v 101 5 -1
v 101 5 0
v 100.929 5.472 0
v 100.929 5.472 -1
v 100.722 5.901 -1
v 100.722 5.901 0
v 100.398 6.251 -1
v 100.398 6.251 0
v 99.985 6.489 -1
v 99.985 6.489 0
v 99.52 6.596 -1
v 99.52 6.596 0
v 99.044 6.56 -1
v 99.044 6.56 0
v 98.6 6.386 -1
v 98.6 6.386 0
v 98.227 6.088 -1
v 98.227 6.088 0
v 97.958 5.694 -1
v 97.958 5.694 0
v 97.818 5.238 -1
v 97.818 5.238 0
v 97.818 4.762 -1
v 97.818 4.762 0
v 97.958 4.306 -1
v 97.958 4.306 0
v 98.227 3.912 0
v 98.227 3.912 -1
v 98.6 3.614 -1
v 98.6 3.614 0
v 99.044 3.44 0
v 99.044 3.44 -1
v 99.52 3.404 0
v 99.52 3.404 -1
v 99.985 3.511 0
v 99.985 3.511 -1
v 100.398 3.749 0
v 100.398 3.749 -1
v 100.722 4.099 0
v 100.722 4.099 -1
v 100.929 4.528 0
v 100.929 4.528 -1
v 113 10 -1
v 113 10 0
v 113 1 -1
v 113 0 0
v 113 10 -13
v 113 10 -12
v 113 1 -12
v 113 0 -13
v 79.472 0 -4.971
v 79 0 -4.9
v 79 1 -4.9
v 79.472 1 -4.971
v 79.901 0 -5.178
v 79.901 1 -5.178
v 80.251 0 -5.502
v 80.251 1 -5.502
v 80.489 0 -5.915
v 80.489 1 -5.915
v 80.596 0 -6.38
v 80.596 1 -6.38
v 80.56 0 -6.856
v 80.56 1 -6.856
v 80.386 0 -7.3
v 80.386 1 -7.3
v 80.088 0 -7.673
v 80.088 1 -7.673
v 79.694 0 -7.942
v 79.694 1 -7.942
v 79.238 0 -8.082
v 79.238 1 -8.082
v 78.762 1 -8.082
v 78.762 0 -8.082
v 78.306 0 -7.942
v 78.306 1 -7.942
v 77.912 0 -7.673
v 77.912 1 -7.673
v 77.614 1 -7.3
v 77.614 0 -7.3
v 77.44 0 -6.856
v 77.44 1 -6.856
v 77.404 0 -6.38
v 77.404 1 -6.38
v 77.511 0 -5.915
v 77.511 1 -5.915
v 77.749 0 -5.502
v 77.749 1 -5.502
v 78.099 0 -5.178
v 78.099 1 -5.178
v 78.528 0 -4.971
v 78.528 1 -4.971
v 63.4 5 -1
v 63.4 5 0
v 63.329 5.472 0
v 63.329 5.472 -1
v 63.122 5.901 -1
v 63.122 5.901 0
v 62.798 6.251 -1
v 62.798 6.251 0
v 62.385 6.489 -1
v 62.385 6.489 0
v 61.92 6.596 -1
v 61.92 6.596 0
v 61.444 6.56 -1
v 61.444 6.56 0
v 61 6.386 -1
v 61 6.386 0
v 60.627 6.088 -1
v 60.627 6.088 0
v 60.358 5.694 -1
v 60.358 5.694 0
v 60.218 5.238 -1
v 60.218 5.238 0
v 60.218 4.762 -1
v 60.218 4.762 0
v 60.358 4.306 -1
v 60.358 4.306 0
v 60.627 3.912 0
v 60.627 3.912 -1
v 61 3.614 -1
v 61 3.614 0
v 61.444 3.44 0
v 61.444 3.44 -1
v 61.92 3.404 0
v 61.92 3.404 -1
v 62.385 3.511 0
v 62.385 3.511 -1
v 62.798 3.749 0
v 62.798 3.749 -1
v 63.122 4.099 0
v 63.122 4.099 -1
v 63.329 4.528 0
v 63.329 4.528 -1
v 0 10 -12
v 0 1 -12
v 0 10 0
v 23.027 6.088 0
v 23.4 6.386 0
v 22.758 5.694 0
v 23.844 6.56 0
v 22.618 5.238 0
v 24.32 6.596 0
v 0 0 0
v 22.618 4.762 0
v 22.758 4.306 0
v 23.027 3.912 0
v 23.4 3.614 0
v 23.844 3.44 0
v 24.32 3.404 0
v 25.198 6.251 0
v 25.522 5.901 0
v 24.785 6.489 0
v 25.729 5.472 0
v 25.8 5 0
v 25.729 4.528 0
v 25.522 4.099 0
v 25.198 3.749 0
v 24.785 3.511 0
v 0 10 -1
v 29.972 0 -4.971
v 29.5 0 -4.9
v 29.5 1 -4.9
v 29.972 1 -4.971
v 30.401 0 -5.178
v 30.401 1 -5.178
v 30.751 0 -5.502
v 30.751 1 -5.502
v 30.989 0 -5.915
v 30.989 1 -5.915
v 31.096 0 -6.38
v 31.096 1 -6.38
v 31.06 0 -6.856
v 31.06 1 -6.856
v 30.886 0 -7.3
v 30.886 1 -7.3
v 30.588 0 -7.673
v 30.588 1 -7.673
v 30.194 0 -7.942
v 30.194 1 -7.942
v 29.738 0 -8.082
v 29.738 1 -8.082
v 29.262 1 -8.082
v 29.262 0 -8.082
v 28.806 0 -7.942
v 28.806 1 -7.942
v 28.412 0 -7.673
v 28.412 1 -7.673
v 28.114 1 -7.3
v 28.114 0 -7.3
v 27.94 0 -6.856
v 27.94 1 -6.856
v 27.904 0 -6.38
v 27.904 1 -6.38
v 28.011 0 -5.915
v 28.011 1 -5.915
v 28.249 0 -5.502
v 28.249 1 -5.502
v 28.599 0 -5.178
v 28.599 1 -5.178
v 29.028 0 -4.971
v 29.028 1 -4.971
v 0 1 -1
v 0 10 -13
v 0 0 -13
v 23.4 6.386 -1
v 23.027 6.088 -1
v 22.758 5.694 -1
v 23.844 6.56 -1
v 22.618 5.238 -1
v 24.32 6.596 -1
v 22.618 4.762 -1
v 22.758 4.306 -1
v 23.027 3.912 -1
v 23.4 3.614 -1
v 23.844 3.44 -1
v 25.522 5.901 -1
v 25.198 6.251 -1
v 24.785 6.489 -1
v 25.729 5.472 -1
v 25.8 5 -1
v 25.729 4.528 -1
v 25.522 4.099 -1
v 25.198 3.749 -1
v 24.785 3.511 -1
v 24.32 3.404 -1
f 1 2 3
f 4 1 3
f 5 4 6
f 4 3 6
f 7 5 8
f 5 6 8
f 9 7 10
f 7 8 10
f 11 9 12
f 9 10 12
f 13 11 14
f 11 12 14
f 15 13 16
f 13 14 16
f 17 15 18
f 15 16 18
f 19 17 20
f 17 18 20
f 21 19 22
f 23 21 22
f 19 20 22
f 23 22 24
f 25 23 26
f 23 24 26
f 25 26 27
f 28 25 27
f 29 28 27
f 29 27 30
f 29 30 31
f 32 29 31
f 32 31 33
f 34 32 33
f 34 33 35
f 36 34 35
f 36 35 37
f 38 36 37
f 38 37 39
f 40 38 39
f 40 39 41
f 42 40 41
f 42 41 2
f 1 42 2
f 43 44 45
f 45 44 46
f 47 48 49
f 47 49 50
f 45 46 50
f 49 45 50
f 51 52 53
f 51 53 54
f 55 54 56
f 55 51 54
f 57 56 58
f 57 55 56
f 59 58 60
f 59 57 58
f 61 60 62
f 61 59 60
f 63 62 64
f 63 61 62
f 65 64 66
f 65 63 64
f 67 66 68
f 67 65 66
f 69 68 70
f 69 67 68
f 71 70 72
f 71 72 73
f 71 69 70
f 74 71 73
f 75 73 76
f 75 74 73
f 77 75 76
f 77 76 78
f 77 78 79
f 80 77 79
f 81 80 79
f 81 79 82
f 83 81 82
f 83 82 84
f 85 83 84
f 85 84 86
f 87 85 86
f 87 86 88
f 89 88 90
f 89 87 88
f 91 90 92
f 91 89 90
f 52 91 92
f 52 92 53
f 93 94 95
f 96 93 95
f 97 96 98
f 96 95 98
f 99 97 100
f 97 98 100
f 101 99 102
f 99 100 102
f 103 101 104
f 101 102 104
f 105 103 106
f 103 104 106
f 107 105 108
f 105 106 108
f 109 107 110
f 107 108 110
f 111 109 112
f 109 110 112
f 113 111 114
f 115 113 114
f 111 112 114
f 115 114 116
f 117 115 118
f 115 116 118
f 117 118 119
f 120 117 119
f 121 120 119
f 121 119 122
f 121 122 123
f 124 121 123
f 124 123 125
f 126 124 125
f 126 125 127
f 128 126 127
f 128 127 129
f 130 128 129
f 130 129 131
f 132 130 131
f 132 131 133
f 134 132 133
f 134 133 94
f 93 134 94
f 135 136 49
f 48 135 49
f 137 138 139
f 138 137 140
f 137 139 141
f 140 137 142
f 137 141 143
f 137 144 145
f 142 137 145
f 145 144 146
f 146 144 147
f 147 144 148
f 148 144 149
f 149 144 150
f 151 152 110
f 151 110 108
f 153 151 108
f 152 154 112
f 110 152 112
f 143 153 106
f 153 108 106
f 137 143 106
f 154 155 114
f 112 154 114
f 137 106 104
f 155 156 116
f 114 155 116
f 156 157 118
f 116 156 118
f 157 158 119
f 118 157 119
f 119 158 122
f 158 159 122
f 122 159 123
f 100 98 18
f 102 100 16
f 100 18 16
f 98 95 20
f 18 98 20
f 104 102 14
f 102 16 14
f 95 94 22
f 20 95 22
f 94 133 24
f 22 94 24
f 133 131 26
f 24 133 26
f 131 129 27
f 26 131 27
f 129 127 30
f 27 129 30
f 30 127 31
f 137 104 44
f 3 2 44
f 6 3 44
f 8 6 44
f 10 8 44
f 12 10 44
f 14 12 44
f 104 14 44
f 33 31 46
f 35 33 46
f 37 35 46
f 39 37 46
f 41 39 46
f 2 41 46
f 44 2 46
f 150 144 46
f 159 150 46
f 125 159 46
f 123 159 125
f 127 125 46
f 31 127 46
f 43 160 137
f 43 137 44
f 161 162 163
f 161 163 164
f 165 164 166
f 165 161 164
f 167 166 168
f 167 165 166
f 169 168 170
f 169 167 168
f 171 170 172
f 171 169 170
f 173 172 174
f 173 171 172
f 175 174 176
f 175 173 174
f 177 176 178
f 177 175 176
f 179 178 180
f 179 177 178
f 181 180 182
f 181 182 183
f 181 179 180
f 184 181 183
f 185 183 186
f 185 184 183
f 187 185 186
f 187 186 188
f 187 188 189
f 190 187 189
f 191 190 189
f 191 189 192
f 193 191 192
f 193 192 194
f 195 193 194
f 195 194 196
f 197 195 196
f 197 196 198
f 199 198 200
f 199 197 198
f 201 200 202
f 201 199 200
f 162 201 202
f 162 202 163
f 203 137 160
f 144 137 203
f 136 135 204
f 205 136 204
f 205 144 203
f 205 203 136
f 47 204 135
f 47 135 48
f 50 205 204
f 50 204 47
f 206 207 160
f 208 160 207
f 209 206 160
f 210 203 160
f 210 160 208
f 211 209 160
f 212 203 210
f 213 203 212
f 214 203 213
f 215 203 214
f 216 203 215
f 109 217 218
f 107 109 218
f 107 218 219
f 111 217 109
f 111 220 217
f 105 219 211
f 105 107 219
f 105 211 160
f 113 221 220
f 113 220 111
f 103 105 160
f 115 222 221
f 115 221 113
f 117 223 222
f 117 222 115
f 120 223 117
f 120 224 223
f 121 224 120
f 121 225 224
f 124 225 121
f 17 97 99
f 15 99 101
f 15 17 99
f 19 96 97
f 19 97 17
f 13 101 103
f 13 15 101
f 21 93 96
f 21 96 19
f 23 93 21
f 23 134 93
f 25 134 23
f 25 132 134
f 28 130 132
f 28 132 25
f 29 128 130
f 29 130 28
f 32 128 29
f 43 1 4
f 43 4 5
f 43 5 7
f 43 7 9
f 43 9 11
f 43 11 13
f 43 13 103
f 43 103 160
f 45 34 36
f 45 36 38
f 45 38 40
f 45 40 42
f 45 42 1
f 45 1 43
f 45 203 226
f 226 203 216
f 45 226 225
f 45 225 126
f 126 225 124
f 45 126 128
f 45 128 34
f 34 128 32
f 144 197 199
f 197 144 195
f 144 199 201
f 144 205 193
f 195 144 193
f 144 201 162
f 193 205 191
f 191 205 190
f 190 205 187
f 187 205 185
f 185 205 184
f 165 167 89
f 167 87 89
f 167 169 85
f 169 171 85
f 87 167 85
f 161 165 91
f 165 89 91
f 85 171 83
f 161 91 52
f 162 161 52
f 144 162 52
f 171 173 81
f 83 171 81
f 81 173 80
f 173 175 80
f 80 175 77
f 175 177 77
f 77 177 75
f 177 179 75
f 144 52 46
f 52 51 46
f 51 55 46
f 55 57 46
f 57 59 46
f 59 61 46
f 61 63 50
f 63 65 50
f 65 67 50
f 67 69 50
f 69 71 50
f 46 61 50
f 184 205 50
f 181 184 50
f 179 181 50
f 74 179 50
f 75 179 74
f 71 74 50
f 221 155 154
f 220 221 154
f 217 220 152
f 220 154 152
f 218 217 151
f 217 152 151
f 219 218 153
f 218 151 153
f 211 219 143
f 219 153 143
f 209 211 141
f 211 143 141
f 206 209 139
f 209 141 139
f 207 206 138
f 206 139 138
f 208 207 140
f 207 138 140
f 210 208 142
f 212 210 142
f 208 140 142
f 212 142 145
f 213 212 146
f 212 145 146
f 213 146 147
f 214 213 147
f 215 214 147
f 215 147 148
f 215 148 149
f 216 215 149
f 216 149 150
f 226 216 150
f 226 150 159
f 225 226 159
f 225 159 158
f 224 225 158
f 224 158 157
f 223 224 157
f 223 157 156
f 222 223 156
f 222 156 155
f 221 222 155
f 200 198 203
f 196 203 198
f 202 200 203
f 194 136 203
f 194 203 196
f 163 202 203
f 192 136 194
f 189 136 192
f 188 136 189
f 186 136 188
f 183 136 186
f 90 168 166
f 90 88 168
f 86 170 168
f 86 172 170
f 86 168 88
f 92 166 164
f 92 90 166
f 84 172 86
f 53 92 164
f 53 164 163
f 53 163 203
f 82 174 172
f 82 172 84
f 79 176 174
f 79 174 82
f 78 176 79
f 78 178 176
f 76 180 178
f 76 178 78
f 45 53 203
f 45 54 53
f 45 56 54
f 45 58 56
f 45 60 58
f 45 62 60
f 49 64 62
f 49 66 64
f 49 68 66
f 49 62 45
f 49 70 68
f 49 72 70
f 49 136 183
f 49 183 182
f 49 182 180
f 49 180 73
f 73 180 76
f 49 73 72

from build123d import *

# Parameters (mm, degrees)
ESQUISSE1_W             = 113
ESQUISSE1_H             = 13
ESQUISSE1_R             = 1.6
BOSS_EXTRU_1_DEPTH      = 1
ESQUISSE2_W             = 113
ESQUISSE2_H             = 1
BOSS_EXTRU_2_DEPTH      = 9
ENL_V_MAT_EXTRU_1_REACH = 116.184
ESQUISSE3_R             = 1.6


with BuildPart() as part:
    # Esquisse1 → Boss.-Extru.1 (new body)
    with BuildSketch(Plane(origin=(0, 0, 0), x_dir=(1, 0, 0), z_dir=(0, 1, 0))):
        with Locations((56.5, 6.5)):
            Rectangle(ESQUISSE1_W, ESQUISSE1_H)
        with Locations(Location((79, 6.5, 0), (0, 0, 270))):
            Circle(ESQUISSE1_R, mode=Mode.SUBTRACT)
        with Locations(Location((29.5, 6.5, 0), (0, 0, 270))):
            Circle(ESQUISSE1_R, mode=Mode.SUBTRACT)
    extrude(amount=BOSS_EXTRU_1_DEPTH)

    # Esquisse2 → Boss.-Extru.2 (add)
    with BuildSketch(Plane(origin=(0, 1, 0), x_dir=(1, 0, 0), z_dir=(0, 1, 0))):
        with Locations((56.5, 12.5)):
            Rectangle(ESQUISSE2_W, ESQUISSE2_H)
        with Locations((56.5, 0.5)):
            Rectangle(ESQUISSE2_W, ESQUISSE2_H)
    extrude(amount=BOSS_EXTRU_2_DEPTH)

    # Esquisse3 → Enlèv. mat.-Extru.1 (cut, up to next)
    with BuildSketch(Plane.XY, mode=Mode.PRIVATE) as enl_v_mat_extru_1_sk1:
        with Locations((99.4, 5)):
            Circle(ESQUISSE3_R)
    enl_v_mat_extru_1_tool1 = extrude(enl_v_mat_extru_1_sk1.sketch, amount=-ENL_V_MAT_EXTRU_1_REACH, mode=Mode.PRIVATE) & part.part
    # Esquisse3 → Enlèv. mat.-Extru.1 (cut, up to next)
    with BuildSketch(Plane.XY, mode=Mode.PRIVATE) as enl_v_mat_extru_1_sk2:
        with Locations((61.8, 5)):
            Circle(ESQUISSE3_R)
    enl_v_mat_extru_1_tool2 = extrude(enl_v_mat_extru_1_sk2.sketch, amount=-ENL_V_MAT_EXTRU_1_REACH, mode=Mode.PRIVATE) & part.part
    # Esquisse3 → Enlèv. mat.-Extru.1 (cut, up to next)
    with BuildSketch(Plane.XY, mode=Mode.PRIVATE) as enl_v_mat_extru_1_sk3:
        with Locations((24.2, 5)):
            Circle(ESQUISSE3_R)
    enl_v_mat_extru_1_tool3 = extrude(enl_v_mat_extru_1_sk3.sketch, amount=-ENL_V_MAT_EXTRU_1_REACH, mode=Mode.PRIVATE) & part.part
    add(enl_v_mat_extru_1_tool1.solids().sort_by_distance((99.4, 5, 0))[0], mode=Mode.SUBTRACT)
    add(enl_v_mat_extru_1_tool2.solids().sort_by_distance((61.8, 5, 0))[0], mode=Mode.SUBTRACT)
    add(enl_v_mat_extru_1_tool3.solids().sort_by_distance((24.2, 5, 0))[0], mode=Mode.SUBTRACT)


solid = part.part
